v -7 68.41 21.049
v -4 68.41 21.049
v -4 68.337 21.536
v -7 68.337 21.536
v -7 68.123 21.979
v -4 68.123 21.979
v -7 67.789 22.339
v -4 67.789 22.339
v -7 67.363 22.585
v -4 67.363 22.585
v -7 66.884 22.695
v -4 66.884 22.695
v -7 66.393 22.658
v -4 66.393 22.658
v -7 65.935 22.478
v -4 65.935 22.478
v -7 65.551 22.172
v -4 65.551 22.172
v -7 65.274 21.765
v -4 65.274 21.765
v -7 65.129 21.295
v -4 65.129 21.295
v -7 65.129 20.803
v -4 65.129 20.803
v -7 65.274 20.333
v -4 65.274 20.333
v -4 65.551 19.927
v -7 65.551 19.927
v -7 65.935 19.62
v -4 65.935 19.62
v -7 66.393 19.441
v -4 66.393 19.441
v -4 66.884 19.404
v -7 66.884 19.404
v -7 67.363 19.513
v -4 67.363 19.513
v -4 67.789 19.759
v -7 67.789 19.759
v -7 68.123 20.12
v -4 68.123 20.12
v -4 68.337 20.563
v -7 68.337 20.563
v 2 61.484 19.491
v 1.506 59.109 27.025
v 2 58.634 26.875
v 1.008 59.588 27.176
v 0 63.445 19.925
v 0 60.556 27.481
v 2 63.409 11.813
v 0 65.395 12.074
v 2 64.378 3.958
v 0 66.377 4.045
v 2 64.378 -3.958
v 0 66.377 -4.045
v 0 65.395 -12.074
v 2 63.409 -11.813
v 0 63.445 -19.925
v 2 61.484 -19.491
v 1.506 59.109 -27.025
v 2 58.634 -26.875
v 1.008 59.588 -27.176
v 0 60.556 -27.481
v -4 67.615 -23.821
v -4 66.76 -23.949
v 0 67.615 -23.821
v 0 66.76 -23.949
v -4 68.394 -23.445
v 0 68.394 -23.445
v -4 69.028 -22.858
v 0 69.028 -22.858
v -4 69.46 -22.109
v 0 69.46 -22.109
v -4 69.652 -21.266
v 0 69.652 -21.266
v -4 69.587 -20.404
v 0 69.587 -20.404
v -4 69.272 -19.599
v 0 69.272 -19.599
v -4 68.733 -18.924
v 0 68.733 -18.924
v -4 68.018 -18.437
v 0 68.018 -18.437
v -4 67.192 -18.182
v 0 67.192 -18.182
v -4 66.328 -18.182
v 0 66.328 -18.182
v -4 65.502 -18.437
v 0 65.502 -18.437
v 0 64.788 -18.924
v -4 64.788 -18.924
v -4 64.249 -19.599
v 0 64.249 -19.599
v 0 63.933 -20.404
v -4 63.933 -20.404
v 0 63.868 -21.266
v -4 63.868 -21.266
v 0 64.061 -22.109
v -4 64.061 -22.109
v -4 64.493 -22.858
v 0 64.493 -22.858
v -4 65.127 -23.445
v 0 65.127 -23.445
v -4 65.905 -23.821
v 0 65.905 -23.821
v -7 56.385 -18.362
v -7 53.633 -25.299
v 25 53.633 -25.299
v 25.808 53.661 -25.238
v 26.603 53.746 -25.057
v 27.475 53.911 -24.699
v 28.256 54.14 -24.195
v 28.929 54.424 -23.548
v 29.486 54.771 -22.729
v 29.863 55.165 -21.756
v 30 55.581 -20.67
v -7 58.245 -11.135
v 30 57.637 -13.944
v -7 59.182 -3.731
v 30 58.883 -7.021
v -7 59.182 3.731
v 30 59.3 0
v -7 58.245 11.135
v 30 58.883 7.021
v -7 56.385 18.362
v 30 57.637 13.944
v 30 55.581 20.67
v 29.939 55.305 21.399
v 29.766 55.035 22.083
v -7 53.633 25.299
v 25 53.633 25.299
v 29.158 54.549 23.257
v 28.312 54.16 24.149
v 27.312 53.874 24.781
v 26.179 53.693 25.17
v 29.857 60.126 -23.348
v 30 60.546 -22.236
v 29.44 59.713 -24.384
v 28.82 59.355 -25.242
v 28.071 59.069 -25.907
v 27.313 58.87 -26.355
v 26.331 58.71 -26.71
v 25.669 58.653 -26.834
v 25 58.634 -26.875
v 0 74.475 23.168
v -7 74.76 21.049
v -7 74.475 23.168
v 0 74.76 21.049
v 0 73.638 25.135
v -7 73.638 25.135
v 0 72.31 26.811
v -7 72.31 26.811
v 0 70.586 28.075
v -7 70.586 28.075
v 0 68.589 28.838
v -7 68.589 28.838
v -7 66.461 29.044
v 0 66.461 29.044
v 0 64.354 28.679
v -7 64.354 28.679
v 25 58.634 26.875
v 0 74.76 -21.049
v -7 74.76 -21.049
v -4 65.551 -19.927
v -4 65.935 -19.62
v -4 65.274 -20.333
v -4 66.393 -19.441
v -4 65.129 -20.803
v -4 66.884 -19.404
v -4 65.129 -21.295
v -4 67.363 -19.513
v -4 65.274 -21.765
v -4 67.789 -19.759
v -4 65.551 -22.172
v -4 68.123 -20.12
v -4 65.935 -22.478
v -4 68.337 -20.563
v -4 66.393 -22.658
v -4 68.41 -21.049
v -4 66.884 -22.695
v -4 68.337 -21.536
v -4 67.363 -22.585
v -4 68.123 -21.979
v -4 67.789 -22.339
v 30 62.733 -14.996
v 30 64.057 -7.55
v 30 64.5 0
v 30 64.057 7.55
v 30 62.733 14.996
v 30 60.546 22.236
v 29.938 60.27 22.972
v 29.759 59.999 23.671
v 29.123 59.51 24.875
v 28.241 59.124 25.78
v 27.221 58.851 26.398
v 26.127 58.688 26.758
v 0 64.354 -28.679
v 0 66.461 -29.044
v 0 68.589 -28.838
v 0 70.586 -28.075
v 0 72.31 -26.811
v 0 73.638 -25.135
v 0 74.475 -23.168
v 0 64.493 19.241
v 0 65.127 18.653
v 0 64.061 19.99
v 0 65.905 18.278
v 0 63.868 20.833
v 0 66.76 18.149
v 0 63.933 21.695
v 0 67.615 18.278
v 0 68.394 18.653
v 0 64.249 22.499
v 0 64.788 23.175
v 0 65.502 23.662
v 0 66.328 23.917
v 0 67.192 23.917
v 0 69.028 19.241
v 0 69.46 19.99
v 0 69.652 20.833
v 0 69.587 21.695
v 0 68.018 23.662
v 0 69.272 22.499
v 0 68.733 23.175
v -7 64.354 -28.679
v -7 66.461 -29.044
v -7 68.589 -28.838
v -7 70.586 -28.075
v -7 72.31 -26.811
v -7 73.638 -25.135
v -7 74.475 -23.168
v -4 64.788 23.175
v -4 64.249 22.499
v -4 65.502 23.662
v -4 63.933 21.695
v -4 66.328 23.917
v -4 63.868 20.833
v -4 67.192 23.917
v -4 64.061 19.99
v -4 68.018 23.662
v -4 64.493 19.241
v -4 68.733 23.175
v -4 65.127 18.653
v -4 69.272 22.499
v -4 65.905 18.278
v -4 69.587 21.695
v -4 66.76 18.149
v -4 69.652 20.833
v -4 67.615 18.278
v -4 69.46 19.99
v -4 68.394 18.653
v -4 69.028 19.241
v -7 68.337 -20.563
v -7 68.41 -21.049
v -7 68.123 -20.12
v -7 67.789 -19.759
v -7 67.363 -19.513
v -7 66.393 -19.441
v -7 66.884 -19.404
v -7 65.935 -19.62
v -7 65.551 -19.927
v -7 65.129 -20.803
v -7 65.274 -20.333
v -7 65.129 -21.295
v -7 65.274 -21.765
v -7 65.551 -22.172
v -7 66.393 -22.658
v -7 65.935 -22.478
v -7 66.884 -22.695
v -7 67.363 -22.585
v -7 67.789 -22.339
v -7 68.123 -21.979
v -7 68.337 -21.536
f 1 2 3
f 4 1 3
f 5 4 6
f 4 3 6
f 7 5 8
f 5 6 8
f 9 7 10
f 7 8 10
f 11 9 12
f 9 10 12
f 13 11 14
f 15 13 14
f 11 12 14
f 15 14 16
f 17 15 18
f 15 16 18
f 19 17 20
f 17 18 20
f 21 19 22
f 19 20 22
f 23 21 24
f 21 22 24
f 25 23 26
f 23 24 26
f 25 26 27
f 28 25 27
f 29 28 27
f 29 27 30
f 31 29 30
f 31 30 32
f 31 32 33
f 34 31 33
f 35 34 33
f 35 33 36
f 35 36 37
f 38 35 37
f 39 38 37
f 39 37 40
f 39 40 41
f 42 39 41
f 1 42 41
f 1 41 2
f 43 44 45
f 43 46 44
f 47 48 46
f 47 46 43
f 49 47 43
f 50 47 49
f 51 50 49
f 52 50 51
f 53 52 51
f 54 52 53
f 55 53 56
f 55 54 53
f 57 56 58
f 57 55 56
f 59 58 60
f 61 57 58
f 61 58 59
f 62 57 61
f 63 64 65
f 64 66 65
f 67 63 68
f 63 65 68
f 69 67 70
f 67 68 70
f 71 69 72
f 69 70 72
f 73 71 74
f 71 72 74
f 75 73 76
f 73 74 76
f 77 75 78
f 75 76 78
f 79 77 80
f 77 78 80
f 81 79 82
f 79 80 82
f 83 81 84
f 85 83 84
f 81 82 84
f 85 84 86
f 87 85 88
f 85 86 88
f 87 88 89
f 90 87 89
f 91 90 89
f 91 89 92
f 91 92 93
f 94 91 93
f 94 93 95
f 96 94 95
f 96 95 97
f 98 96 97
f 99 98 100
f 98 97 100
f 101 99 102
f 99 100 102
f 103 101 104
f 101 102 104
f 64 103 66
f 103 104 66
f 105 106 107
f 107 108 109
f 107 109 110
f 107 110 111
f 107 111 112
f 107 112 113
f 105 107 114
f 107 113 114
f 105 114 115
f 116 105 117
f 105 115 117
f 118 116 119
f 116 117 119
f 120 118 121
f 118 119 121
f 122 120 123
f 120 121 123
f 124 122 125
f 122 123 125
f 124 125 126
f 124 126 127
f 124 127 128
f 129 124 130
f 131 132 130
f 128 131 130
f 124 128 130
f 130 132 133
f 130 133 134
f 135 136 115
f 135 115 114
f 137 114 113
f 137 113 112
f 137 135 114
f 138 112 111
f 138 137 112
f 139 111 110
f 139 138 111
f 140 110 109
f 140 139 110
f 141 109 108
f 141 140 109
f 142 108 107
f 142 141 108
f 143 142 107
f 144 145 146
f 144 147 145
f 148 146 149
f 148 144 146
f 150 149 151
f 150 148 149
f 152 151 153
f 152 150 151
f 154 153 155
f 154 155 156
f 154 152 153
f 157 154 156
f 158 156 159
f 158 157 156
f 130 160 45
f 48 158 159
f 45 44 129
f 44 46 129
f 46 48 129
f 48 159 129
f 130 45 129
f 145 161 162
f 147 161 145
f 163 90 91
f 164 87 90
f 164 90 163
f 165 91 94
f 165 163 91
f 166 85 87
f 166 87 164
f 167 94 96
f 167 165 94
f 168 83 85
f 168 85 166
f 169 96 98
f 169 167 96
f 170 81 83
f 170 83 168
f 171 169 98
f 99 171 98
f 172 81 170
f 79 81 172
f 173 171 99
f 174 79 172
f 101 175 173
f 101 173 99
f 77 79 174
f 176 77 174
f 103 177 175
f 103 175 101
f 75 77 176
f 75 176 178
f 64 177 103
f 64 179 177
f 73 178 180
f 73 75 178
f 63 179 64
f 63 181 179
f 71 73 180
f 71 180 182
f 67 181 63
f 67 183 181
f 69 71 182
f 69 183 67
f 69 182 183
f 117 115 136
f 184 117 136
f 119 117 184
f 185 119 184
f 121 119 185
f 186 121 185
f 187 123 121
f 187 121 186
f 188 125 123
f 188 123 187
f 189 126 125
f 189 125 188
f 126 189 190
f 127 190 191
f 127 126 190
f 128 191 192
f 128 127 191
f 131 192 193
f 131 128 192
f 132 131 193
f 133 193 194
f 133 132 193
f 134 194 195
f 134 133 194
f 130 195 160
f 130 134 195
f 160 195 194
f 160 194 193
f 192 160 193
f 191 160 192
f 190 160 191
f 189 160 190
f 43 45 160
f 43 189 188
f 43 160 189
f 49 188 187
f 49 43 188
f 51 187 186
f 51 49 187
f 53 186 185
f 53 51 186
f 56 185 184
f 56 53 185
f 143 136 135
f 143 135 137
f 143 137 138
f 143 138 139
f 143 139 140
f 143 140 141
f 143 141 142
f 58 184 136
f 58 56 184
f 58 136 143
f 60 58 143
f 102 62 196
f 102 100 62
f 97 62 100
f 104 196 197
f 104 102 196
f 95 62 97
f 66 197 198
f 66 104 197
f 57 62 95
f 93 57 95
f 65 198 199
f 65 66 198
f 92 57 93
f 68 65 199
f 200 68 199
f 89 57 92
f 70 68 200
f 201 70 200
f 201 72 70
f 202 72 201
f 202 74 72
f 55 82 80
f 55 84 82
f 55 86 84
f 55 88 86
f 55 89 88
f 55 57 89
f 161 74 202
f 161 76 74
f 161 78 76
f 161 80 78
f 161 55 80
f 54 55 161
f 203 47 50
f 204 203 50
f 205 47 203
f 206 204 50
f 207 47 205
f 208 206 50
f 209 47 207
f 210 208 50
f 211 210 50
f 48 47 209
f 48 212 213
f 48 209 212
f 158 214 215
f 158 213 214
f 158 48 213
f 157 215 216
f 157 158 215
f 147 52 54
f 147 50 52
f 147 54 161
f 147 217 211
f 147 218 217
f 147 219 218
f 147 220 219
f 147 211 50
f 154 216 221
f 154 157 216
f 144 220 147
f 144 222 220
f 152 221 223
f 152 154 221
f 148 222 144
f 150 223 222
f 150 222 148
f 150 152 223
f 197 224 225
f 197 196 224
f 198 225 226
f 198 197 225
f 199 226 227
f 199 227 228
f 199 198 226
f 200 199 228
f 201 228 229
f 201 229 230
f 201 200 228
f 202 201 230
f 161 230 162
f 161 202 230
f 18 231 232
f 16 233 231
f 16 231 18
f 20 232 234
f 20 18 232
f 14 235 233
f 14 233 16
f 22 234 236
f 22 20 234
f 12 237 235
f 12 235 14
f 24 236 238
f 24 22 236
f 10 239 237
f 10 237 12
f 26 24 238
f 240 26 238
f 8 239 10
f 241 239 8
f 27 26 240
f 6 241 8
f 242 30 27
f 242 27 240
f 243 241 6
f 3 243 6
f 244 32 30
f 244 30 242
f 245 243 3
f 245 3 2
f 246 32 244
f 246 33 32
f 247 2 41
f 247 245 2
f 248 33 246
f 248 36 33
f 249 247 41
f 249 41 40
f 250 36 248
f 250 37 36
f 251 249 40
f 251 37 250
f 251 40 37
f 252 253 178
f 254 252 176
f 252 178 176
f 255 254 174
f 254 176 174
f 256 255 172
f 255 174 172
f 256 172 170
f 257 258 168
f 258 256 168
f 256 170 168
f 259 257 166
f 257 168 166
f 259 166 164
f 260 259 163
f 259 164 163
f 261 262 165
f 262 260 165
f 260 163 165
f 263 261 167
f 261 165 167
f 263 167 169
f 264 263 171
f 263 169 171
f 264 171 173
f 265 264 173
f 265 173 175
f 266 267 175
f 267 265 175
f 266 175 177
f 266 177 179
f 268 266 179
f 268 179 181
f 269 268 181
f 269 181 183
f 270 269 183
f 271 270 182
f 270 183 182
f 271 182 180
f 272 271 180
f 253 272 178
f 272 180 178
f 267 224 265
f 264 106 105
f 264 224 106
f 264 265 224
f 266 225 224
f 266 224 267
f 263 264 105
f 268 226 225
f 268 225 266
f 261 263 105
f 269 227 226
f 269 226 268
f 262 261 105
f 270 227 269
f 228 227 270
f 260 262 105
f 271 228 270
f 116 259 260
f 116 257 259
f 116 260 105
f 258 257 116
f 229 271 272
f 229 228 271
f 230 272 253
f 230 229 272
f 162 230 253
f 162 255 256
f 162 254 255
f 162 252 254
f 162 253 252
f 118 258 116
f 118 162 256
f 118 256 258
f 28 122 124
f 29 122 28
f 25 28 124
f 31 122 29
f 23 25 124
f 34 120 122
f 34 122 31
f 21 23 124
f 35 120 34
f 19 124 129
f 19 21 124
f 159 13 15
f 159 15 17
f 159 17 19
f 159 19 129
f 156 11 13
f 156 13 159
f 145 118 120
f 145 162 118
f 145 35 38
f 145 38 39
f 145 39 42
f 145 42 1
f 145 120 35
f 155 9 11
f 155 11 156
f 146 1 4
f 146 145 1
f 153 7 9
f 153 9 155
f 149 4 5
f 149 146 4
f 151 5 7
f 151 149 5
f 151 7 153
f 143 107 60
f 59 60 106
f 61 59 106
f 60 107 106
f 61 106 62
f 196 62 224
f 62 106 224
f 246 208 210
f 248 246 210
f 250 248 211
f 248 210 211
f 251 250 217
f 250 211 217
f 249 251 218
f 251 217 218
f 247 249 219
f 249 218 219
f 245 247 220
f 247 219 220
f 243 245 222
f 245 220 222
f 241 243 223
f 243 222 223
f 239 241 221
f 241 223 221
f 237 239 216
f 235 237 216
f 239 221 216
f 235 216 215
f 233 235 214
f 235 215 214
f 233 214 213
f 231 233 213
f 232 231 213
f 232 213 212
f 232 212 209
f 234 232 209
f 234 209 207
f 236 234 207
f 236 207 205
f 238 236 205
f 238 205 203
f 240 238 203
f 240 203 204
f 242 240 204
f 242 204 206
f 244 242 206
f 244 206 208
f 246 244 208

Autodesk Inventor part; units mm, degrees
ref_plane "YZ Plane" through (0, 0, 0) normal (1, 0, 0) x (0, 1, 0)
ref_plane "XZ Plane" through (0, 0, 0) normal (0, 1, 0) x (-1, 0, 0)
ref_plane "XY Plane" through (0, 0, 0) normal (0, 0, 1) x (1, 0, 0)
sketch "Sketch1" plane through (0, 0, 0) normal (1, 0, 0) x (0, 1, 0)
  circle A0 centre (0, 0) radius 70
  line L0 (0, 0) -> (66.7602, 21.0494) construction
  line L1 (66.7602, -21.0494) -> (0, 0) construction
  line L2 (66.7602, -21.0494) -> (66.7602, 21.0494) construction
  circle A1 centre (66.7602, 21.0494) radius 1.65
  circle A2 centre (66.7602, -21.0494) radius 1.65
  circle A3 centre (0, 0) radius 57.5
  line L3 (64.3545, 28.6791) -> (-26.6041, 0)
  line L4 (-26.6041, 0) -> (64.3545, -28.6791)
  line L5 (74.7602, -21.0494) -> (74.7602, 21.0494)
  arc A4 (74.7602, 21.0494) -> (64.3545, 28.6791) centre (66.7602, 21.0494) ccw
  arc A5 (64.3545, -28.6791) -> (74.7602, -21.0494) centre (66.7602, -21.0494) ccw
  circle A6 centre (0, 0) radius 64.5
  point P0 (66.7602, 0)
  point P1 (51.8997, 24.7522)
  point P2 (51.8997, -24.7522)
  point P3 (58.6341, 26.8755)
  point P4 (58.6341, -26.8755)
  dimension "d0" = 140
  dimension "d1" = 35
  dimension "d2" = 3.3
  dimension "d3" = 3.3
  dimension "d4" = 115
  dimension "d5" = 8
  dimension "d6" = 8
  dimension "d7" = 7
extrude "Extrusion1" add sketch "Sketch1" against normal blind 7 contours A0 A2 L4 A6 L3 A1 | A0 A1 L3 A4 L5 A5 L4 A2 | A6 L4 A3 L3 picked at (61.9464, 3.0696)
extrude "Extrusion2" add sketch "Sketch1" along normal blind 30 contours A6 L4 A3 L3 picked at (61.9464, 3.0696)
fillet "Fillet1" radius 5 2 edges at (30, 55.2669, 25.8138) (30, 55.2669, -25.8138)
chamfer "Chamfer1" distance 2 angle 45 1 edges at (0, 64.5, 0)
sketch "Sketch2" plane through (0, 0, 0) normal (1, 0, 0) x (0, 0, -1)
  arc A0 (27.4814, 60.5559) -> (-27.4814, 60.5559) centre (0, 0) ccw projected
  line L0 (27.4814, 60.5559) -> (28.6791, 64.3545) projected
  arc A1 (28.6791, 64.3545) -> (21.0494, 74.7602) centre (21.0494, 66.7602) ccw projected
  line L1 (21.0494, 74.7602) -> (-21.0494, 74.7602) projected
  arc A2 (-21.0494, 74.7602) -> (-28.6791, 64.3545) centre (-21.0494, 66.7602) ccw projected
  line L2 (-28.6791, 64.3545) -> (-27.4814, 60.5559) projected
  circle A3 centre (-21.0494, 66.7602) radius 1.65 projected
  circle A4 centre (21.0494, 66.7602) radius 1.65 projected
  circle A5 centre (-21.0494, 66.7602) radius 2.9
  circle A6 centre (21.0494, 66.7602) radius 2.9
  dimension "d16" = 5.8
  dimension "d17" = 5.8
extrude "Extrusion3" cut sketch "Sketch2" against normal blind 4 contours A3 | A4 | A5 | A6
sketch "Sketch3" plane through (-7, 0, 0) normal (-1, 0, 0) x (0, 0, 1)
  arc A0 (24.7522, 51.8997) -> (-24.7522, 51.8997) centre (0, 0) ccw projected
  line L0 (24.7522, 51.8997) -> (28.6791, 64.3545) projected
  arc A1 (28.6791, 64.3545) -> (21.0494, 74.7602) centre (21.0494, 66.7602) ccw projected
  line L1 (21.0494, 74.7602) -> (-21.0494, 74.7602) projected
  arc A2 (-21.0494, 74.7602) -> (-28.6791, 64.3545) centre (-21.0494, 66.7602) ccw projected
  line L2 (-28.6791, 64.3545) -> (-24.7522, 51.8997) projected
  circle A3 centre (21.0494, 66.7602) radius 1.65 projected
  circle A4 centre (-21.0494, 66.7602) radius 1.65 projected
  arc A5 (25.4764, 50.206) -> (-25.4764, 50.206) centre (0, 0) ccw
  line L3 (25.4764, 50.206) -> (29.8236, 63.9937)
  arc A6 (29.8236, 63.9937) -> (21.0494, 75.9602) centre (21.0494, 66.7602) ccw
  line L4 (21.0494, 75.9602) -> (-21.0494, 75.9602)
  arc A7 (-21.0494, 75.9602) -> (-29.8236, 63.9937) centre (-21.0494, 66.7602) ccw
  line L5 (-29.8236, 63.9937) -> (-25.4764, 50.206)
  line L6 (0, -26.6041) -> (-28.6791, 64.3545) projected
  line L7 (28.6791, 64.3545) -> (0, -26.6041) projected
  point P0 (24.3877, 50.7438)
  point P1 (-24.3877, 50.7438)
  dimension "d20" = 1.2
extrude "Extrusion4" add sketch "Sketch3" against normal blind 20 contours L7 A5 L6 A0
sketch "Sketch4" plane through (30, 0, 0) normal (1, 0, 0) x (0, 0, -1)
  line L0 (22.2357, 60.5461) -> (20.1282, 53.8619) projected
  arc A0 (22.2357, 60.5461) -> (-22.2357, 60.5461) centre (0, 0) ccw projected
  line L1 (-20.1282, 53.8619) -> (-22.2357, 60.5461) projected
  line L2 (-20.1282, 53.8619) -> (-22.2357, 60.5461) projected
  spline S0 degree 3 poles (-22.2357, 60.5461) (-22.8268, 60.329) (-23.4536, 60.088) (-24.6005, 59.6276) (-25.1209, 59.4087) (-25.9393, 59.0559) (-26.2925, 58.8984) (-26.7214, 58.7049) (-26.8341, 58.6531) (-26.8662, 58.6384) (-26.8693, 58.6369) (-26.8724, 58.6355) (-26.8755, 58.6341) knots 0.753525 0.753525 0.753525 0.753525 0.94243 0.94243 1.131336 1.131336 1.319777 1.319777 1.476719 1.476719 1.476719 1.491826 1.491826 1.491826 1.491826 projected
  line L3 (-26.8755, 58.6341) -> (-24.7522, 51.8997) projected
  line L4 (22.2357, 60.5461) -> (20.1282, 53.8619) projected
  spline S1 degree 8 poles (20.1282, 53.8619) (20.3348, 53.7847) (20.5411, 53.7066) (20.7457, 53.6281) (20.9475, 53.5496) (21.1456, 53.4716) (21.339, 53.3945) (21.5271, 53.3186) (21.9974, 53.1268) (22.2707, 53.0133) (22.5278, 52.9047) (22.768, 52.8016) (22.9911, 52.7046) (23.1973, 52.6138) (23.3871, 52.5293) (23.8704, 52.3122) (24.1287, 52.1937) (24.34, 52.0952) (24.5063, 52.0167) (24.6296, 51.9582) (24.7112, 51.9192) (24.7522, 51.8997) (24.7522, 51.8997) knots 0 0 0 0 0 0 0 0 0 0.185394 0.185394 0.185394 0.185394 0.185394 0.185394 0.185394 0.478501 0.478501 0.478501 0.478501 0.478501 0.478501 0.478501 1 1 1 1 1 1 1 1 1 projected
  line L5 (24.7522, 51.8997) -> (26.8755, 58.6341) projected
  arc A1 (24.3877, 50.7438) -> (-24.3877, 50.7438) centre (0, 0) ccw projected
  arc A2 (25.6872, 53.4477) -> (-25.6872, 53.4477) centre (0, 0) ccw
  line L6 (-24.7522, 51.8997) -> (-24.3877, 50.7438)
  line L7 (24.7522, 51.8997) -> (24.3877, 50.7438)
  point P0 (20.6702, 55.5809)
  point P1 (-25.2986, 53.6328)
  point P2 (25.2986, 53.6328)
  dimension "d23" = 3
extrude "Extrusion5" cut sketch "Sketch4" against normal through all contours A2 L5 S1 L0 | L0 S1 L7 A1 L6 L3 A2
properties part number "SEGURO_CANALETA" material "Steel, Mild, Welded"
